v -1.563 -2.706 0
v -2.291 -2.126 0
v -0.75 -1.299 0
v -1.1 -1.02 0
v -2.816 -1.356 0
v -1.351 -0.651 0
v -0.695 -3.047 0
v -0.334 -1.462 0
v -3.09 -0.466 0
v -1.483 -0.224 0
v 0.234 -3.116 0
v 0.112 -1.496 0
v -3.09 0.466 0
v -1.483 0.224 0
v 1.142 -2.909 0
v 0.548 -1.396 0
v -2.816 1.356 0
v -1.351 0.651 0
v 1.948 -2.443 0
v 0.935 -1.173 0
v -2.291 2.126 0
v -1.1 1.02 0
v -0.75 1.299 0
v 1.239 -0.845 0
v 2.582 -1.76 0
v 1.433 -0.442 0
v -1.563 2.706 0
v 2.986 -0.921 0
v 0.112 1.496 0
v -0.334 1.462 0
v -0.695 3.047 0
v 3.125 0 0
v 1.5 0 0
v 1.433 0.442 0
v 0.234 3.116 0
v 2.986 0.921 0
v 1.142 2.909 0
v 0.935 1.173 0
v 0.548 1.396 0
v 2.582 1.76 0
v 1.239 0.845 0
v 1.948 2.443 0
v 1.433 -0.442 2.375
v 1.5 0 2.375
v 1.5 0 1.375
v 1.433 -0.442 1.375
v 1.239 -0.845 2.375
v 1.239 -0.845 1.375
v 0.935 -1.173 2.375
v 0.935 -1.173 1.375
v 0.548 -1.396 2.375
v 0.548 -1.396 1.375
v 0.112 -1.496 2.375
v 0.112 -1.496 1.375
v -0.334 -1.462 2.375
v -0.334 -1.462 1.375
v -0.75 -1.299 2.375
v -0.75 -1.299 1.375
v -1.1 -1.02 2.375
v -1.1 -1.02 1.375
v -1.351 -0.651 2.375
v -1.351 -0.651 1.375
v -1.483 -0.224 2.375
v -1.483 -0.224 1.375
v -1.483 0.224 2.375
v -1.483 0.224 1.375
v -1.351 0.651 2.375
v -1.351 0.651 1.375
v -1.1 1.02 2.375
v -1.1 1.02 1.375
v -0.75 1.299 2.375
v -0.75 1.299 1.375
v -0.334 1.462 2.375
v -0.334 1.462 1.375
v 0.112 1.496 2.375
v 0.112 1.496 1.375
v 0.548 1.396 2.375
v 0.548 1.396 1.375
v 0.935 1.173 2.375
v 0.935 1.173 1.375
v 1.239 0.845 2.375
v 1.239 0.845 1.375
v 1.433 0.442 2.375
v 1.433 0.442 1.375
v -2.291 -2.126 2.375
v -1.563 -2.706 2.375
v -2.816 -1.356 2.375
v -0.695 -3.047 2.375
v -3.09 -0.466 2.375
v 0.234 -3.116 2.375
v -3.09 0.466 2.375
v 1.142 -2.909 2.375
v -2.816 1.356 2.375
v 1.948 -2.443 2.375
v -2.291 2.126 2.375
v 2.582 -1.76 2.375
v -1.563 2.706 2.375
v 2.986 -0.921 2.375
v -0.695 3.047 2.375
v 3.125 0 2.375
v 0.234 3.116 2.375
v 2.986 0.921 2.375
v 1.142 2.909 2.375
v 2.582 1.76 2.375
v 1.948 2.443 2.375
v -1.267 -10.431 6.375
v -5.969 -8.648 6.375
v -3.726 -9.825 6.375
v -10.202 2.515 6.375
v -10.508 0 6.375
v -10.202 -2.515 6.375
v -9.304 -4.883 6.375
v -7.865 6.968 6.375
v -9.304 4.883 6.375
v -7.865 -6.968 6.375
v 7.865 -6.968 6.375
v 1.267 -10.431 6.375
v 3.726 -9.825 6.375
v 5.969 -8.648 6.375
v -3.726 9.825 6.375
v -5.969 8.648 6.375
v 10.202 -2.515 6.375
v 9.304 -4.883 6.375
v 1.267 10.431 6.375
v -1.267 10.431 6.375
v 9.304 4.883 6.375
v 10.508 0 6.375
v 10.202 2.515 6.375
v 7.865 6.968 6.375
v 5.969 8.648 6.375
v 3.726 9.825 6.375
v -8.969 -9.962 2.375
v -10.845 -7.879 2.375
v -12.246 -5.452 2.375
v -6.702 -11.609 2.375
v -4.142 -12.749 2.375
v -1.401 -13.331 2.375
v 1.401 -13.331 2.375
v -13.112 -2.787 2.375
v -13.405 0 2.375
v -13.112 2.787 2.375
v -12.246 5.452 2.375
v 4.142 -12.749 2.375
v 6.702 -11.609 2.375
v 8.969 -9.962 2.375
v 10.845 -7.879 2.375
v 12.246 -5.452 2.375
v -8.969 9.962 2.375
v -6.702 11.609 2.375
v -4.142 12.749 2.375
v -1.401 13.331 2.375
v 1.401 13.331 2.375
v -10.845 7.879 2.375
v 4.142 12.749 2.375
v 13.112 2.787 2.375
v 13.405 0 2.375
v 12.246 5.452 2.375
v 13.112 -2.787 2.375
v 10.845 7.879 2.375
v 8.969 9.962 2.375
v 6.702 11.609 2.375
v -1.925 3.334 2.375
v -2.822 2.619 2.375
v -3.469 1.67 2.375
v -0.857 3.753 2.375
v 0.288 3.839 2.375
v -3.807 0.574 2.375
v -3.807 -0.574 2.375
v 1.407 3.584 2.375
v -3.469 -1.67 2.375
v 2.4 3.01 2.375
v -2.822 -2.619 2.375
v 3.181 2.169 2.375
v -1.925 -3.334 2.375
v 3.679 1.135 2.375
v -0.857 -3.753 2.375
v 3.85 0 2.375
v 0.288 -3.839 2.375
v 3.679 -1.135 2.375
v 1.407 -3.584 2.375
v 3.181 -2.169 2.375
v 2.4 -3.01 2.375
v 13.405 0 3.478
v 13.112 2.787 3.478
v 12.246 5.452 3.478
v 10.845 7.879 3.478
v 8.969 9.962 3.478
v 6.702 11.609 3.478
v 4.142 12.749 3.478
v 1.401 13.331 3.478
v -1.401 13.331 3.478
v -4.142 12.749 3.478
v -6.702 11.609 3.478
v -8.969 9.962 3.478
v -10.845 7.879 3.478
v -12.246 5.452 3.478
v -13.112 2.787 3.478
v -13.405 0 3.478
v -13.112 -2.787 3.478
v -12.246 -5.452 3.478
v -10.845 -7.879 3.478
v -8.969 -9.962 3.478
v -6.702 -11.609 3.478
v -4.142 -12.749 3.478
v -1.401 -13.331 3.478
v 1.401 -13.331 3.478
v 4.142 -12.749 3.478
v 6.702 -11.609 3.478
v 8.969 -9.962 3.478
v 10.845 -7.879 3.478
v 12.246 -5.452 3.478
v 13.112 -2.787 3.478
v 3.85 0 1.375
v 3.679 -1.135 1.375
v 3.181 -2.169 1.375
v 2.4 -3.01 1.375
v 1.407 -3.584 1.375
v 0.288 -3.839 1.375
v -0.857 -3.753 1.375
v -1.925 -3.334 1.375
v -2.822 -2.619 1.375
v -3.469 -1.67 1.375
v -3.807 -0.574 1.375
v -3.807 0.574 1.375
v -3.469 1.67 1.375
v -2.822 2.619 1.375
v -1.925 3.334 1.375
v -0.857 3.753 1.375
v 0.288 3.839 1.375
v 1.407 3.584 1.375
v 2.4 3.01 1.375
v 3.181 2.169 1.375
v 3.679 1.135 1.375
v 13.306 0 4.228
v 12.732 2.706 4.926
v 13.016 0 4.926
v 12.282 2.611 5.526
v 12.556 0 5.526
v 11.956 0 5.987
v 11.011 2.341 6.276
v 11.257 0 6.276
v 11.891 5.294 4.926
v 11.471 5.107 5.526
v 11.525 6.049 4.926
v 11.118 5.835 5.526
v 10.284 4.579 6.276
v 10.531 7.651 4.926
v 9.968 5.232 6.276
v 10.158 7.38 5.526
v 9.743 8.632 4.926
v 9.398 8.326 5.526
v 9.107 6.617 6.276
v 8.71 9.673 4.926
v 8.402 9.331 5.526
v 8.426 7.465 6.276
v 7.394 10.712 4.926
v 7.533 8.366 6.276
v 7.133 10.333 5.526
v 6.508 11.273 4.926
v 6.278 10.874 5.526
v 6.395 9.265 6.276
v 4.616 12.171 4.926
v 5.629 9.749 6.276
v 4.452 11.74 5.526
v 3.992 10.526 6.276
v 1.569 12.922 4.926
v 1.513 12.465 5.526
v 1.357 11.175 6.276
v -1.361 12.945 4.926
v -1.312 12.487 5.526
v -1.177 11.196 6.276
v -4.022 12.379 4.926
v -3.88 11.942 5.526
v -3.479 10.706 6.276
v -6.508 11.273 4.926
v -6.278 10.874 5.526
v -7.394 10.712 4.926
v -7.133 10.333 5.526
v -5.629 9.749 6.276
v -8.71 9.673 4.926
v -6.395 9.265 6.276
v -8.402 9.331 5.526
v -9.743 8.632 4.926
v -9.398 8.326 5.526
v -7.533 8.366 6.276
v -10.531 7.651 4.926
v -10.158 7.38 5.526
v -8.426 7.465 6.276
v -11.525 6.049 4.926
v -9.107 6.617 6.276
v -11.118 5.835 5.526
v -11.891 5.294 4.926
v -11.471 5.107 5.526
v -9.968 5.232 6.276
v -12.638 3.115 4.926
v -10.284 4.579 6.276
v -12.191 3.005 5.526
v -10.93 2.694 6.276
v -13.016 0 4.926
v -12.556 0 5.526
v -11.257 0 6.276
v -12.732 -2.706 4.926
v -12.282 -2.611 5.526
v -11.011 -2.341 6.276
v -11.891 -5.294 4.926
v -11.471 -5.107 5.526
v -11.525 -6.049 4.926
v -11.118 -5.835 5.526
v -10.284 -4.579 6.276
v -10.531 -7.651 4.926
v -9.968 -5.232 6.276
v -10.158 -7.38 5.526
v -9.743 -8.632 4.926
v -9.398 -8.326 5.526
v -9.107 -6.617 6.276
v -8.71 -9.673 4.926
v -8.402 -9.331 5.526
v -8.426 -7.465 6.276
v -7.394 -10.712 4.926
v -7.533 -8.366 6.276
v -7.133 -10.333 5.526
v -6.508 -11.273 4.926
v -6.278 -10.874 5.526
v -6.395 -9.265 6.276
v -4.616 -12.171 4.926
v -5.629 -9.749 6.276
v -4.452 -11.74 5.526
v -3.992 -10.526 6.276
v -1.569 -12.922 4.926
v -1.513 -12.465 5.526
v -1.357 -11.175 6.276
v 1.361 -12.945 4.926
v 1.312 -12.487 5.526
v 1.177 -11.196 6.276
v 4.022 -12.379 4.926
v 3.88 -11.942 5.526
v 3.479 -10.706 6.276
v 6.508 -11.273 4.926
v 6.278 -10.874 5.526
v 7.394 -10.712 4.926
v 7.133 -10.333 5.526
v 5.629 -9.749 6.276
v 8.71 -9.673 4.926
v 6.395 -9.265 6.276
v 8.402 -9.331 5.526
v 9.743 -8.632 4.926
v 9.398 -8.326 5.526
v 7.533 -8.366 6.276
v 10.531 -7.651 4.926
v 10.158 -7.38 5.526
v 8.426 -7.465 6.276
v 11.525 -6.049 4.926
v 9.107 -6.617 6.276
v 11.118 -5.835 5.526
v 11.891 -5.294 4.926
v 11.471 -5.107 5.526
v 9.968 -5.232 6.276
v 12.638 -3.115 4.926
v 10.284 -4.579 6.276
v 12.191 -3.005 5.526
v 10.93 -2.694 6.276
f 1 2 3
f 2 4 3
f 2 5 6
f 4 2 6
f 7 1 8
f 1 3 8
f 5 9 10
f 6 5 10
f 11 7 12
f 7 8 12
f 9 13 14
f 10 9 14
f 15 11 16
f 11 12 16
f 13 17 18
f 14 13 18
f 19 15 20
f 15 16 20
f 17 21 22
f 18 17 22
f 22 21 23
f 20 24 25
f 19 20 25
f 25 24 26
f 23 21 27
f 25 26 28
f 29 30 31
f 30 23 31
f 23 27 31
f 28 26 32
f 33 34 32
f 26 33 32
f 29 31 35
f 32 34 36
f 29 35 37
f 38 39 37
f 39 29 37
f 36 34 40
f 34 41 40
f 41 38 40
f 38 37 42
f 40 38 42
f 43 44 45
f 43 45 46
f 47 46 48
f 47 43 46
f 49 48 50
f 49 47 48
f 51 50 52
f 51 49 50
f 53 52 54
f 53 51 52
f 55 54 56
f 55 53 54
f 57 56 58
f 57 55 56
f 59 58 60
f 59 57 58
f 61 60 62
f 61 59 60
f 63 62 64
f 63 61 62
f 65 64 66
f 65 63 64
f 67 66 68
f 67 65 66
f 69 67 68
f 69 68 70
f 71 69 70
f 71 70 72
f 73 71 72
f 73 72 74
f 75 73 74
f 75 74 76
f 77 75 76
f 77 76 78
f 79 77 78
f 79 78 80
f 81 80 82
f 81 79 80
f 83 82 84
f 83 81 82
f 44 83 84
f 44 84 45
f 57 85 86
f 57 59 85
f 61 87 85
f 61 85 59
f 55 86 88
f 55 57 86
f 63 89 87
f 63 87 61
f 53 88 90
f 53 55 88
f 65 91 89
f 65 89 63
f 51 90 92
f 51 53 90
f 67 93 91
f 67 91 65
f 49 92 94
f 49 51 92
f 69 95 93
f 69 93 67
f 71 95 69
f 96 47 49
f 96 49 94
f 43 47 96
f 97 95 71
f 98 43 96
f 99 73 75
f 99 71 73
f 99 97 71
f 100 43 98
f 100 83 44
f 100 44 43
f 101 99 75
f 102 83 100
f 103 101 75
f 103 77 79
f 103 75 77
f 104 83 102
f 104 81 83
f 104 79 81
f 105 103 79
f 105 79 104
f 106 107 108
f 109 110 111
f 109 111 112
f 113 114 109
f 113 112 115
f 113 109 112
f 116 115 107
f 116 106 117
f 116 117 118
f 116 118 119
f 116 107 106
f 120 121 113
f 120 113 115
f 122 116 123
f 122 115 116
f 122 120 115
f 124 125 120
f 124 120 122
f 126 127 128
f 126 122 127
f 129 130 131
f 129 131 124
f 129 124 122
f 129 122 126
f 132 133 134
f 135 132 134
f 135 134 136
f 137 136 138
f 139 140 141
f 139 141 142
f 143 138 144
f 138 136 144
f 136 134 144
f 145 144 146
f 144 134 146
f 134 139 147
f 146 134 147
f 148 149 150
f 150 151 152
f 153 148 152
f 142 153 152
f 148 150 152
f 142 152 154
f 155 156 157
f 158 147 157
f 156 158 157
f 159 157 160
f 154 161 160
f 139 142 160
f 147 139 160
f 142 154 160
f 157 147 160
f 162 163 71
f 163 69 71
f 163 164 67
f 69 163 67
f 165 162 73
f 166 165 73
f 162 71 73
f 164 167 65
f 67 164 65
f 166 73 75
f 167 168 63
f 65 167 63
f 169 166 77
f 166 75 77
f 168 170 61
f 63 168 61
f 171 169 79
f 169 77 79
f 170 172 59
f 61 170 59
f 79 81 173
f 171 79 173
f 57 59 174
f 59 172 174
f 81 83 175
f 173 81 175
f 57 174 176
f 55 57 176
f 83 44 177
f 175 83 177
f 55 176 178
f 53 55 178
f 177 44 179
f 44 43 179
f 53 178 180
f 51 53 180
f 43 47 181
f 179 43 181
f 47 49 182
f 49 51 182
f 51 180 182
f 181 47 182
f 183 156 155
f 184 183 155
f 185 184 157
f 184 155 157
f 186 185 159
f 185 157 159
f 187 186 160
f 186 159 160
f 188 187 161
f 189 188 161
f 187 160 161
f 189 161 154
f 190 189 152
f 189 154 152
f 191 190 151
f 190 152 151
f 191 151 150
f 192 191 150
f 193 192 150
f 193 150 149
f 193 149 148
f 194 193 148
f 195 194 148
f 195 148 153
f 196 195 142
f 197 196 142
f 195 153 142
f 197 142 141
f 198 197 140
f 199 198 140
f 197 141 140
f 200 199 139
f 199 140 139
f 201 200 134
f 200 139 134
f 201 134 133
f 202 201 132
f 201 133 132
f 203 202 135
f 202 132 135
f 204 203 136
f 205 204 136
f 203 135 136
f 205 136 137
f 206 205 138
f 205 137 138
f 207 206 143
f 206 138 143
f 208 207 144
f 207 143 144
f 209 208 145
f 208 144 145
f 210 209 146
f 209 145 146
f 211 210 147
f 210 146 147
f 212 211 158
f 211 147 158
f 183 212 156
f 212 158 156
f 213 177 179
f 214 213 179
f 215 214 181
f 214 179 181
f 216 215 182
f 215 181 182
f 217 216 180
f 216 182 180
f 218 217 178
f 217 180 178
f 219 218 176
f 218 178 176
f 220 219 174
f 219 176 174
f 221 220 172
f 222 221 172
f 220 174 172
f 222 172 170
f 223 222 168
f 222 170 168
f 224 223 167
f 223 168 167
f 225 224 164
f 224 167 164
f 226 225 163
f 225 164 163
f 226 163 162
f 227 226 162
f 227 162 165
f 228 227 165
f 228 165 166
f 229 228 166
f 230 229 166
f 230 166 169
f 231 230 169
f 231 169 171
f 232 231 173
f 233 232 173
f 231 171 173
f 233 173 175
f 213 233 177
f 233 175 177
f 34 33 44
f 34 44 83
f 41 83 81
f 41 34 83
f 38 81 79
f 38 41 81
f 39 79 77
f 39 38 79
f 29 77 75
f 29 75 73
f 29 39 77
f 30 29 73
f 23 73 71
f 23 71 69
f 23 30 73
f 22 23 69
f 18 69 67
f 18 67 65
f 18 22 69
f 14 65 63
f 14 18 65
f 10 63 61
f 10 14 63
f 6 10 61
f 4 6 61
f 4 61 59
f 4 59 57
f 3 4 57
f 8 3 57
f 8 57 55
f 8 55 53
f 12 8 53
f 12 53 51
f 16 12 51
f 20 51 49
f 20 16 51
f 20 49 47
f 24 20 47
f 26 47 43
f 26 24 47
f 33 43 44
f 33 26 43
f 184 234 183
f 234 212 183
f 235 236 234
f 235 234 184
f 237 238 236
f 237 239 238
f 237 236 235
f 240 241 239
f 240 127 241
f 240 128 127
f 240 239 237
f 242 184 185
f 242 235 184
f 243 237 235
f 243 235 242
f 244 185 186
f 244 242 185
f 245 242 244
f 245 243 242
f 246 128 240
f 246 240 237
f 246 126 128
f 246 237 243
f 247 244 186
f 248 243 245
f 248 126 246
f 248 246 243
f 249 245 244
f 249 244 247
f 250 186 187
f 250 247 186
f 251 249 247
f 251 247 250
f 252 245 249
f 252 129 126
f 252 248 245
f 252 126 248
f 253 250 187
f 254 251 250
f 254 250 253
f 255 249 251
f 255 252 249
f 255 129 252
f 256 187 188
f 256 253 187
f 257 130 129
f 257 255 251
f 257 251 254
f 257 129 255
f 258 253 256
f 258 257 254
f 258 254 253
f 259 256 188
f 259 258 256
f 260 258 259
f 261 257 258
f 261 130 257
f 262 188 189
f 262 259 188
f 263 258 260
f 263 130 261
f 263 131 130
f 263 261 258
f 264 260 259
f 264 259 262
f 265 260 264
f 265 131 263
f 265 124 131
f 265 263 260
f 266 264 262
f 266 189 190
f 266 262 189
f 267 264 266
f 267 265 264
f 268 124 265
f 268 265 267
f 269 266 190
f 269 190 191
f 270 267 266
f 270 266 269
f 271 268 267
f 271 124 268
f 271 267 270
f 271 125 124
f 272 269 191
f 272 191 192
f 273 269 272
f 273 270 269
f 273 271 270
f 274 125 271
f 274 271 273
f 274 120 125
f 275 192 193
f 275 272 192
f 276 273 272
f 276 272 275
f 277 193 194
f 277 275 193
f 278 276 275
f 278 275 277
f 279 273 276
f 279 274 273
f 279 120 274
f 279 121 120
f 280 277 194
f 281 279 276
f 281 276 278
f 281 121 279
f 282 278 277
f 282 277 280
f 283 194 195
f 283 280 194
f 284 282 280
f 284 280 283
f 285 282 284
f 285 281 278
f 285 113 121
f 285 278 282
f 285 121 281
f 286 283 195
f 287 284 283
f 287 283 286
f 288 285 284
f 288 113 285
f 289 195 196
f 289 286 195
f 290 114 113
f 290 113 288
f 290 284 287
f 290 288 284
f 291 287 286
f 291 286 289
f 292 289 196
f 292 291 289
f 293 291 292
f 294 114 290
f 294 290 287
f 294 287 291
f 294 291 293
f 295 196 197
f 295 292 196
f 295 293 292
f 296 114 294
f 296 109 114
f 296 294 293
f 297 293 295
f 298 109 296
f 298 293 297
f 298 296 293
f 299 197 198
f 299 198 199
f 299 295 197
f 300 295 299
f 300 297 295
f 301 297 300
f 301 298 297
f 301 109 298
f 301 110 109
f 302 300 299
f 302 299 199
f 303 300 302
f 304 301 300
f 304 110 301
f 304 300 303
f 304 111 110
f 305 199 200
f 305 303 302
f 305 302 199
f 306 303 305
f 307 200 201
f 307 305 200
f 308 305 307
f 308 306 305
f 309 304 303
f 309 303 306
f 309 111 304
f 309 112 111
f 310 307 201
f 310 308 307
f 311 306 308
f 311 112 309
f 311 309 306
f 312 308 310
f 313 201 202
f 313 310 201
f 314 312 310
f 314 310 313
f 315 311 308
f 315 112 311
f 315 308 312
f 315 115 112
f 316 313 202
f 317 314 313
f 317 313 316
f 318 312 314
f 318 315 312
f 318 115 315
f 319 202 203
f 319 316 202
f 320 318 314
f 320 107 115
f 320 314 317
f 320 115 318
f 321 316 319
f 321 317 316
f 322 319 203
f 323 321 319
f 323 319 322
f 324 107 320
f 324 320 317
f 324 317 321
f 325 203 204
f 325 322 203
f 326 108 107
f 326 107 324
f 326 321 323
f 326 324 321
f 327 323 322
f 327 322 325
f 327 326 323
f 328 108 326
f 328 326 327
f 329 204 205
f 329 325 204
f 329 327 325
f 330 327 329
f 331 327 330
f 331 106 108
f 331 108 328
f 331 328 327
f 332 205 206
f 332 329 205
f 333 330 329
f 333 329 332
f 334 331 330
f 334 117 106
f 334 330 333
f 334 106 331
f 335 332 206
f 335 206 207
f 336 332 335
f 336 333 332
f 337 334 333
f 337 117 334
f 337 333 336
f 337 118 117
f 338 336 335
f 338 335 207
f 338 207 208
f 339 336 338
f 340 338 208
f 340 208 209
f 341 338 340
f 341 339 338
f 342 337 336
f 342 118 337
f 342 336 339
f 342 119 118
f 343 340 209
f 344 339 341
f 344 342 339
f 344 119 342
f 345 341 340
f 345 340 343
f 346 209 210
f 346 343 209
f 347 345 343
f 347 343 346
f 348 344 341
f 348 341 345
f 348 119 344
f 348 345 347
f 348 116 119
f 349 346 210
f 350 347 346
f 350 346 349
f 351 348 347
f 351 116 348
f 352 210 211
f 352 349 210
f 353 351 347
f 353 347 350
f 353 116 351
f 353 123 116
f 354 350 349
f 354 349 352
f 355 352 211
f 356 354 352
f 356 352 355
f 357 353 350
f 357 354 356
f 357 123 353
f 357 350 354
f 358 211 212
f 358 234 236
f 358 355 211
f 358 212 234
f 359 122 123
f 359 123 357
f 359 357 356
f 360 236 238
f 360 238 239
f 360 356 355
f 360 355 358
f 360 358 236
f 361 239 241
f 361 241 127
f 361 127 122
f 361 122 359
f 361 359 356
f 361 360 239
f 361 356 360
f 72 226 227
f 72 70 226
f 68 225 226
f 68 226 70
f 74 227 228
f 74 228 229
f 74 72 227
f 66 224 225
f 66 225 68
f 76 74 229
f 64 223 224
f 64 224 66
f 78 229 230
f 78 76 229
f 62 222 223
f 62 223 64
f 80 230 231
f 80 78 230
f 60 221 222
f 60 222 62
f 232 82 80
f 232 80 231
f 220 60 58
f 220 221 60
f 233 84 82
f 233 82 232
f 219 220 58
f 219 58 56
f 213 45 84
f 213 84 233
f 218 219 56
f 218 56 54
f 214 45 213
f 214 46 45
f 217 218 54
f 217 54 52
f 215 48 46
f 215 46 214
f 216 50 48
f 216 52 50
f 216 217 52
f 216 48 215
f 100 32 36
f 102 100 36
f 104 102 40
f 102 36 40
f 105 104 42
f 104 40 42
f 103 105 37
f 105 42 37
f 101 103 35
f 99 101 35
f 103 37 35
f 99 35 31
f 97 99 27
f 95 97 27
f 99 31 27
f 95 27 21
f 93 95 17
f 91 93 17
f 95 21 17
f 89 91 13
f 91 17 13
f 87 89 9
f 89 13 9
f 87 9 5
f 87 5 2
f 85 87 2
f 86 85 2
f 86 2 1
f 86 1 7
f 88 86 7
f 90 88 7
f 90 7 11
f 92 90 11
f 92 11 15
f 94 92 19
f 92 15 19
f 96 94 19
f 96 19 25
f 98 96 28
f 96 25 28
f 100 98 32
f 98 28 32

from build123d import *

# Parameters (mm, degrees)
F0_R     = 3.125
F0_R_2   = 1.5
F1_DEPTH = 2.375
F2_R     = 13.4045840815
F2_R_2   = 3.125
F2_R_3   = 1.5
F3_DEPTH = 4
F4_R     = 2.8970562748
F5_R     = 3.85
F5_R_2   = 1.5
F6_DEPTH = 1
F7_DEPTH = 4


with BuildPart() as f1:
    # F0 (on Top) → F1 (new body)
    with BuildSketch(Plane.XY):
        Circle(F0_R)
        Circle(F0_R_2, mode=Mode.SUBTRACT)
    extrude(amount=F1_DEPTH)


with BuildPart() as f3:
    # F2 (on face) → F3 (new body)
    with BuildSketch(Plane.XY.offset(2.375)):
        Circle(F2_R)
        Circle(F2_R_2, mode=Mode.SUBTRACT)
        Circle(F2_R_2)
        Circle(F2_R_3, mode=Mode.SUBTRACT)
    extrude(amount=F3_DEPTH)

    # F4
    f4_edges = [f3.edges().sort_by_distance(p)[0] for p in [
        (-13.404584, 0, 6.375),
    ]]
    fillet(f4_edges, radius=F4_R)

    # F5 (on face) → F7 (join)
    with BuildSketch(Plane(origin=(0, 0, 2.375), x_dir=(1, 0, 0), z_dir=(0, 0, -1))):
        Circle(F5_R)
        Circle(F5_R_2, mode=Mode.SUBTRACT)
        Circle(F5_R_2)
    extrude(amount=-F7_DEPTH)


with BuildPart() as f6:
    # F5 (on face) → F6 (new body)
    with BuildSketch(Plane(origin=(0, 0, 2.375), x_dir=(1, 0, 0), z_dir=(0, 0, -1))):
        Circle(F5_R)
        Circle(F5_R_2, mode=Mode.SUBTRACT)
    extrude(amount=F6_DEPTH)


solid = Compound([f1.part, f3.part, f6.part])
